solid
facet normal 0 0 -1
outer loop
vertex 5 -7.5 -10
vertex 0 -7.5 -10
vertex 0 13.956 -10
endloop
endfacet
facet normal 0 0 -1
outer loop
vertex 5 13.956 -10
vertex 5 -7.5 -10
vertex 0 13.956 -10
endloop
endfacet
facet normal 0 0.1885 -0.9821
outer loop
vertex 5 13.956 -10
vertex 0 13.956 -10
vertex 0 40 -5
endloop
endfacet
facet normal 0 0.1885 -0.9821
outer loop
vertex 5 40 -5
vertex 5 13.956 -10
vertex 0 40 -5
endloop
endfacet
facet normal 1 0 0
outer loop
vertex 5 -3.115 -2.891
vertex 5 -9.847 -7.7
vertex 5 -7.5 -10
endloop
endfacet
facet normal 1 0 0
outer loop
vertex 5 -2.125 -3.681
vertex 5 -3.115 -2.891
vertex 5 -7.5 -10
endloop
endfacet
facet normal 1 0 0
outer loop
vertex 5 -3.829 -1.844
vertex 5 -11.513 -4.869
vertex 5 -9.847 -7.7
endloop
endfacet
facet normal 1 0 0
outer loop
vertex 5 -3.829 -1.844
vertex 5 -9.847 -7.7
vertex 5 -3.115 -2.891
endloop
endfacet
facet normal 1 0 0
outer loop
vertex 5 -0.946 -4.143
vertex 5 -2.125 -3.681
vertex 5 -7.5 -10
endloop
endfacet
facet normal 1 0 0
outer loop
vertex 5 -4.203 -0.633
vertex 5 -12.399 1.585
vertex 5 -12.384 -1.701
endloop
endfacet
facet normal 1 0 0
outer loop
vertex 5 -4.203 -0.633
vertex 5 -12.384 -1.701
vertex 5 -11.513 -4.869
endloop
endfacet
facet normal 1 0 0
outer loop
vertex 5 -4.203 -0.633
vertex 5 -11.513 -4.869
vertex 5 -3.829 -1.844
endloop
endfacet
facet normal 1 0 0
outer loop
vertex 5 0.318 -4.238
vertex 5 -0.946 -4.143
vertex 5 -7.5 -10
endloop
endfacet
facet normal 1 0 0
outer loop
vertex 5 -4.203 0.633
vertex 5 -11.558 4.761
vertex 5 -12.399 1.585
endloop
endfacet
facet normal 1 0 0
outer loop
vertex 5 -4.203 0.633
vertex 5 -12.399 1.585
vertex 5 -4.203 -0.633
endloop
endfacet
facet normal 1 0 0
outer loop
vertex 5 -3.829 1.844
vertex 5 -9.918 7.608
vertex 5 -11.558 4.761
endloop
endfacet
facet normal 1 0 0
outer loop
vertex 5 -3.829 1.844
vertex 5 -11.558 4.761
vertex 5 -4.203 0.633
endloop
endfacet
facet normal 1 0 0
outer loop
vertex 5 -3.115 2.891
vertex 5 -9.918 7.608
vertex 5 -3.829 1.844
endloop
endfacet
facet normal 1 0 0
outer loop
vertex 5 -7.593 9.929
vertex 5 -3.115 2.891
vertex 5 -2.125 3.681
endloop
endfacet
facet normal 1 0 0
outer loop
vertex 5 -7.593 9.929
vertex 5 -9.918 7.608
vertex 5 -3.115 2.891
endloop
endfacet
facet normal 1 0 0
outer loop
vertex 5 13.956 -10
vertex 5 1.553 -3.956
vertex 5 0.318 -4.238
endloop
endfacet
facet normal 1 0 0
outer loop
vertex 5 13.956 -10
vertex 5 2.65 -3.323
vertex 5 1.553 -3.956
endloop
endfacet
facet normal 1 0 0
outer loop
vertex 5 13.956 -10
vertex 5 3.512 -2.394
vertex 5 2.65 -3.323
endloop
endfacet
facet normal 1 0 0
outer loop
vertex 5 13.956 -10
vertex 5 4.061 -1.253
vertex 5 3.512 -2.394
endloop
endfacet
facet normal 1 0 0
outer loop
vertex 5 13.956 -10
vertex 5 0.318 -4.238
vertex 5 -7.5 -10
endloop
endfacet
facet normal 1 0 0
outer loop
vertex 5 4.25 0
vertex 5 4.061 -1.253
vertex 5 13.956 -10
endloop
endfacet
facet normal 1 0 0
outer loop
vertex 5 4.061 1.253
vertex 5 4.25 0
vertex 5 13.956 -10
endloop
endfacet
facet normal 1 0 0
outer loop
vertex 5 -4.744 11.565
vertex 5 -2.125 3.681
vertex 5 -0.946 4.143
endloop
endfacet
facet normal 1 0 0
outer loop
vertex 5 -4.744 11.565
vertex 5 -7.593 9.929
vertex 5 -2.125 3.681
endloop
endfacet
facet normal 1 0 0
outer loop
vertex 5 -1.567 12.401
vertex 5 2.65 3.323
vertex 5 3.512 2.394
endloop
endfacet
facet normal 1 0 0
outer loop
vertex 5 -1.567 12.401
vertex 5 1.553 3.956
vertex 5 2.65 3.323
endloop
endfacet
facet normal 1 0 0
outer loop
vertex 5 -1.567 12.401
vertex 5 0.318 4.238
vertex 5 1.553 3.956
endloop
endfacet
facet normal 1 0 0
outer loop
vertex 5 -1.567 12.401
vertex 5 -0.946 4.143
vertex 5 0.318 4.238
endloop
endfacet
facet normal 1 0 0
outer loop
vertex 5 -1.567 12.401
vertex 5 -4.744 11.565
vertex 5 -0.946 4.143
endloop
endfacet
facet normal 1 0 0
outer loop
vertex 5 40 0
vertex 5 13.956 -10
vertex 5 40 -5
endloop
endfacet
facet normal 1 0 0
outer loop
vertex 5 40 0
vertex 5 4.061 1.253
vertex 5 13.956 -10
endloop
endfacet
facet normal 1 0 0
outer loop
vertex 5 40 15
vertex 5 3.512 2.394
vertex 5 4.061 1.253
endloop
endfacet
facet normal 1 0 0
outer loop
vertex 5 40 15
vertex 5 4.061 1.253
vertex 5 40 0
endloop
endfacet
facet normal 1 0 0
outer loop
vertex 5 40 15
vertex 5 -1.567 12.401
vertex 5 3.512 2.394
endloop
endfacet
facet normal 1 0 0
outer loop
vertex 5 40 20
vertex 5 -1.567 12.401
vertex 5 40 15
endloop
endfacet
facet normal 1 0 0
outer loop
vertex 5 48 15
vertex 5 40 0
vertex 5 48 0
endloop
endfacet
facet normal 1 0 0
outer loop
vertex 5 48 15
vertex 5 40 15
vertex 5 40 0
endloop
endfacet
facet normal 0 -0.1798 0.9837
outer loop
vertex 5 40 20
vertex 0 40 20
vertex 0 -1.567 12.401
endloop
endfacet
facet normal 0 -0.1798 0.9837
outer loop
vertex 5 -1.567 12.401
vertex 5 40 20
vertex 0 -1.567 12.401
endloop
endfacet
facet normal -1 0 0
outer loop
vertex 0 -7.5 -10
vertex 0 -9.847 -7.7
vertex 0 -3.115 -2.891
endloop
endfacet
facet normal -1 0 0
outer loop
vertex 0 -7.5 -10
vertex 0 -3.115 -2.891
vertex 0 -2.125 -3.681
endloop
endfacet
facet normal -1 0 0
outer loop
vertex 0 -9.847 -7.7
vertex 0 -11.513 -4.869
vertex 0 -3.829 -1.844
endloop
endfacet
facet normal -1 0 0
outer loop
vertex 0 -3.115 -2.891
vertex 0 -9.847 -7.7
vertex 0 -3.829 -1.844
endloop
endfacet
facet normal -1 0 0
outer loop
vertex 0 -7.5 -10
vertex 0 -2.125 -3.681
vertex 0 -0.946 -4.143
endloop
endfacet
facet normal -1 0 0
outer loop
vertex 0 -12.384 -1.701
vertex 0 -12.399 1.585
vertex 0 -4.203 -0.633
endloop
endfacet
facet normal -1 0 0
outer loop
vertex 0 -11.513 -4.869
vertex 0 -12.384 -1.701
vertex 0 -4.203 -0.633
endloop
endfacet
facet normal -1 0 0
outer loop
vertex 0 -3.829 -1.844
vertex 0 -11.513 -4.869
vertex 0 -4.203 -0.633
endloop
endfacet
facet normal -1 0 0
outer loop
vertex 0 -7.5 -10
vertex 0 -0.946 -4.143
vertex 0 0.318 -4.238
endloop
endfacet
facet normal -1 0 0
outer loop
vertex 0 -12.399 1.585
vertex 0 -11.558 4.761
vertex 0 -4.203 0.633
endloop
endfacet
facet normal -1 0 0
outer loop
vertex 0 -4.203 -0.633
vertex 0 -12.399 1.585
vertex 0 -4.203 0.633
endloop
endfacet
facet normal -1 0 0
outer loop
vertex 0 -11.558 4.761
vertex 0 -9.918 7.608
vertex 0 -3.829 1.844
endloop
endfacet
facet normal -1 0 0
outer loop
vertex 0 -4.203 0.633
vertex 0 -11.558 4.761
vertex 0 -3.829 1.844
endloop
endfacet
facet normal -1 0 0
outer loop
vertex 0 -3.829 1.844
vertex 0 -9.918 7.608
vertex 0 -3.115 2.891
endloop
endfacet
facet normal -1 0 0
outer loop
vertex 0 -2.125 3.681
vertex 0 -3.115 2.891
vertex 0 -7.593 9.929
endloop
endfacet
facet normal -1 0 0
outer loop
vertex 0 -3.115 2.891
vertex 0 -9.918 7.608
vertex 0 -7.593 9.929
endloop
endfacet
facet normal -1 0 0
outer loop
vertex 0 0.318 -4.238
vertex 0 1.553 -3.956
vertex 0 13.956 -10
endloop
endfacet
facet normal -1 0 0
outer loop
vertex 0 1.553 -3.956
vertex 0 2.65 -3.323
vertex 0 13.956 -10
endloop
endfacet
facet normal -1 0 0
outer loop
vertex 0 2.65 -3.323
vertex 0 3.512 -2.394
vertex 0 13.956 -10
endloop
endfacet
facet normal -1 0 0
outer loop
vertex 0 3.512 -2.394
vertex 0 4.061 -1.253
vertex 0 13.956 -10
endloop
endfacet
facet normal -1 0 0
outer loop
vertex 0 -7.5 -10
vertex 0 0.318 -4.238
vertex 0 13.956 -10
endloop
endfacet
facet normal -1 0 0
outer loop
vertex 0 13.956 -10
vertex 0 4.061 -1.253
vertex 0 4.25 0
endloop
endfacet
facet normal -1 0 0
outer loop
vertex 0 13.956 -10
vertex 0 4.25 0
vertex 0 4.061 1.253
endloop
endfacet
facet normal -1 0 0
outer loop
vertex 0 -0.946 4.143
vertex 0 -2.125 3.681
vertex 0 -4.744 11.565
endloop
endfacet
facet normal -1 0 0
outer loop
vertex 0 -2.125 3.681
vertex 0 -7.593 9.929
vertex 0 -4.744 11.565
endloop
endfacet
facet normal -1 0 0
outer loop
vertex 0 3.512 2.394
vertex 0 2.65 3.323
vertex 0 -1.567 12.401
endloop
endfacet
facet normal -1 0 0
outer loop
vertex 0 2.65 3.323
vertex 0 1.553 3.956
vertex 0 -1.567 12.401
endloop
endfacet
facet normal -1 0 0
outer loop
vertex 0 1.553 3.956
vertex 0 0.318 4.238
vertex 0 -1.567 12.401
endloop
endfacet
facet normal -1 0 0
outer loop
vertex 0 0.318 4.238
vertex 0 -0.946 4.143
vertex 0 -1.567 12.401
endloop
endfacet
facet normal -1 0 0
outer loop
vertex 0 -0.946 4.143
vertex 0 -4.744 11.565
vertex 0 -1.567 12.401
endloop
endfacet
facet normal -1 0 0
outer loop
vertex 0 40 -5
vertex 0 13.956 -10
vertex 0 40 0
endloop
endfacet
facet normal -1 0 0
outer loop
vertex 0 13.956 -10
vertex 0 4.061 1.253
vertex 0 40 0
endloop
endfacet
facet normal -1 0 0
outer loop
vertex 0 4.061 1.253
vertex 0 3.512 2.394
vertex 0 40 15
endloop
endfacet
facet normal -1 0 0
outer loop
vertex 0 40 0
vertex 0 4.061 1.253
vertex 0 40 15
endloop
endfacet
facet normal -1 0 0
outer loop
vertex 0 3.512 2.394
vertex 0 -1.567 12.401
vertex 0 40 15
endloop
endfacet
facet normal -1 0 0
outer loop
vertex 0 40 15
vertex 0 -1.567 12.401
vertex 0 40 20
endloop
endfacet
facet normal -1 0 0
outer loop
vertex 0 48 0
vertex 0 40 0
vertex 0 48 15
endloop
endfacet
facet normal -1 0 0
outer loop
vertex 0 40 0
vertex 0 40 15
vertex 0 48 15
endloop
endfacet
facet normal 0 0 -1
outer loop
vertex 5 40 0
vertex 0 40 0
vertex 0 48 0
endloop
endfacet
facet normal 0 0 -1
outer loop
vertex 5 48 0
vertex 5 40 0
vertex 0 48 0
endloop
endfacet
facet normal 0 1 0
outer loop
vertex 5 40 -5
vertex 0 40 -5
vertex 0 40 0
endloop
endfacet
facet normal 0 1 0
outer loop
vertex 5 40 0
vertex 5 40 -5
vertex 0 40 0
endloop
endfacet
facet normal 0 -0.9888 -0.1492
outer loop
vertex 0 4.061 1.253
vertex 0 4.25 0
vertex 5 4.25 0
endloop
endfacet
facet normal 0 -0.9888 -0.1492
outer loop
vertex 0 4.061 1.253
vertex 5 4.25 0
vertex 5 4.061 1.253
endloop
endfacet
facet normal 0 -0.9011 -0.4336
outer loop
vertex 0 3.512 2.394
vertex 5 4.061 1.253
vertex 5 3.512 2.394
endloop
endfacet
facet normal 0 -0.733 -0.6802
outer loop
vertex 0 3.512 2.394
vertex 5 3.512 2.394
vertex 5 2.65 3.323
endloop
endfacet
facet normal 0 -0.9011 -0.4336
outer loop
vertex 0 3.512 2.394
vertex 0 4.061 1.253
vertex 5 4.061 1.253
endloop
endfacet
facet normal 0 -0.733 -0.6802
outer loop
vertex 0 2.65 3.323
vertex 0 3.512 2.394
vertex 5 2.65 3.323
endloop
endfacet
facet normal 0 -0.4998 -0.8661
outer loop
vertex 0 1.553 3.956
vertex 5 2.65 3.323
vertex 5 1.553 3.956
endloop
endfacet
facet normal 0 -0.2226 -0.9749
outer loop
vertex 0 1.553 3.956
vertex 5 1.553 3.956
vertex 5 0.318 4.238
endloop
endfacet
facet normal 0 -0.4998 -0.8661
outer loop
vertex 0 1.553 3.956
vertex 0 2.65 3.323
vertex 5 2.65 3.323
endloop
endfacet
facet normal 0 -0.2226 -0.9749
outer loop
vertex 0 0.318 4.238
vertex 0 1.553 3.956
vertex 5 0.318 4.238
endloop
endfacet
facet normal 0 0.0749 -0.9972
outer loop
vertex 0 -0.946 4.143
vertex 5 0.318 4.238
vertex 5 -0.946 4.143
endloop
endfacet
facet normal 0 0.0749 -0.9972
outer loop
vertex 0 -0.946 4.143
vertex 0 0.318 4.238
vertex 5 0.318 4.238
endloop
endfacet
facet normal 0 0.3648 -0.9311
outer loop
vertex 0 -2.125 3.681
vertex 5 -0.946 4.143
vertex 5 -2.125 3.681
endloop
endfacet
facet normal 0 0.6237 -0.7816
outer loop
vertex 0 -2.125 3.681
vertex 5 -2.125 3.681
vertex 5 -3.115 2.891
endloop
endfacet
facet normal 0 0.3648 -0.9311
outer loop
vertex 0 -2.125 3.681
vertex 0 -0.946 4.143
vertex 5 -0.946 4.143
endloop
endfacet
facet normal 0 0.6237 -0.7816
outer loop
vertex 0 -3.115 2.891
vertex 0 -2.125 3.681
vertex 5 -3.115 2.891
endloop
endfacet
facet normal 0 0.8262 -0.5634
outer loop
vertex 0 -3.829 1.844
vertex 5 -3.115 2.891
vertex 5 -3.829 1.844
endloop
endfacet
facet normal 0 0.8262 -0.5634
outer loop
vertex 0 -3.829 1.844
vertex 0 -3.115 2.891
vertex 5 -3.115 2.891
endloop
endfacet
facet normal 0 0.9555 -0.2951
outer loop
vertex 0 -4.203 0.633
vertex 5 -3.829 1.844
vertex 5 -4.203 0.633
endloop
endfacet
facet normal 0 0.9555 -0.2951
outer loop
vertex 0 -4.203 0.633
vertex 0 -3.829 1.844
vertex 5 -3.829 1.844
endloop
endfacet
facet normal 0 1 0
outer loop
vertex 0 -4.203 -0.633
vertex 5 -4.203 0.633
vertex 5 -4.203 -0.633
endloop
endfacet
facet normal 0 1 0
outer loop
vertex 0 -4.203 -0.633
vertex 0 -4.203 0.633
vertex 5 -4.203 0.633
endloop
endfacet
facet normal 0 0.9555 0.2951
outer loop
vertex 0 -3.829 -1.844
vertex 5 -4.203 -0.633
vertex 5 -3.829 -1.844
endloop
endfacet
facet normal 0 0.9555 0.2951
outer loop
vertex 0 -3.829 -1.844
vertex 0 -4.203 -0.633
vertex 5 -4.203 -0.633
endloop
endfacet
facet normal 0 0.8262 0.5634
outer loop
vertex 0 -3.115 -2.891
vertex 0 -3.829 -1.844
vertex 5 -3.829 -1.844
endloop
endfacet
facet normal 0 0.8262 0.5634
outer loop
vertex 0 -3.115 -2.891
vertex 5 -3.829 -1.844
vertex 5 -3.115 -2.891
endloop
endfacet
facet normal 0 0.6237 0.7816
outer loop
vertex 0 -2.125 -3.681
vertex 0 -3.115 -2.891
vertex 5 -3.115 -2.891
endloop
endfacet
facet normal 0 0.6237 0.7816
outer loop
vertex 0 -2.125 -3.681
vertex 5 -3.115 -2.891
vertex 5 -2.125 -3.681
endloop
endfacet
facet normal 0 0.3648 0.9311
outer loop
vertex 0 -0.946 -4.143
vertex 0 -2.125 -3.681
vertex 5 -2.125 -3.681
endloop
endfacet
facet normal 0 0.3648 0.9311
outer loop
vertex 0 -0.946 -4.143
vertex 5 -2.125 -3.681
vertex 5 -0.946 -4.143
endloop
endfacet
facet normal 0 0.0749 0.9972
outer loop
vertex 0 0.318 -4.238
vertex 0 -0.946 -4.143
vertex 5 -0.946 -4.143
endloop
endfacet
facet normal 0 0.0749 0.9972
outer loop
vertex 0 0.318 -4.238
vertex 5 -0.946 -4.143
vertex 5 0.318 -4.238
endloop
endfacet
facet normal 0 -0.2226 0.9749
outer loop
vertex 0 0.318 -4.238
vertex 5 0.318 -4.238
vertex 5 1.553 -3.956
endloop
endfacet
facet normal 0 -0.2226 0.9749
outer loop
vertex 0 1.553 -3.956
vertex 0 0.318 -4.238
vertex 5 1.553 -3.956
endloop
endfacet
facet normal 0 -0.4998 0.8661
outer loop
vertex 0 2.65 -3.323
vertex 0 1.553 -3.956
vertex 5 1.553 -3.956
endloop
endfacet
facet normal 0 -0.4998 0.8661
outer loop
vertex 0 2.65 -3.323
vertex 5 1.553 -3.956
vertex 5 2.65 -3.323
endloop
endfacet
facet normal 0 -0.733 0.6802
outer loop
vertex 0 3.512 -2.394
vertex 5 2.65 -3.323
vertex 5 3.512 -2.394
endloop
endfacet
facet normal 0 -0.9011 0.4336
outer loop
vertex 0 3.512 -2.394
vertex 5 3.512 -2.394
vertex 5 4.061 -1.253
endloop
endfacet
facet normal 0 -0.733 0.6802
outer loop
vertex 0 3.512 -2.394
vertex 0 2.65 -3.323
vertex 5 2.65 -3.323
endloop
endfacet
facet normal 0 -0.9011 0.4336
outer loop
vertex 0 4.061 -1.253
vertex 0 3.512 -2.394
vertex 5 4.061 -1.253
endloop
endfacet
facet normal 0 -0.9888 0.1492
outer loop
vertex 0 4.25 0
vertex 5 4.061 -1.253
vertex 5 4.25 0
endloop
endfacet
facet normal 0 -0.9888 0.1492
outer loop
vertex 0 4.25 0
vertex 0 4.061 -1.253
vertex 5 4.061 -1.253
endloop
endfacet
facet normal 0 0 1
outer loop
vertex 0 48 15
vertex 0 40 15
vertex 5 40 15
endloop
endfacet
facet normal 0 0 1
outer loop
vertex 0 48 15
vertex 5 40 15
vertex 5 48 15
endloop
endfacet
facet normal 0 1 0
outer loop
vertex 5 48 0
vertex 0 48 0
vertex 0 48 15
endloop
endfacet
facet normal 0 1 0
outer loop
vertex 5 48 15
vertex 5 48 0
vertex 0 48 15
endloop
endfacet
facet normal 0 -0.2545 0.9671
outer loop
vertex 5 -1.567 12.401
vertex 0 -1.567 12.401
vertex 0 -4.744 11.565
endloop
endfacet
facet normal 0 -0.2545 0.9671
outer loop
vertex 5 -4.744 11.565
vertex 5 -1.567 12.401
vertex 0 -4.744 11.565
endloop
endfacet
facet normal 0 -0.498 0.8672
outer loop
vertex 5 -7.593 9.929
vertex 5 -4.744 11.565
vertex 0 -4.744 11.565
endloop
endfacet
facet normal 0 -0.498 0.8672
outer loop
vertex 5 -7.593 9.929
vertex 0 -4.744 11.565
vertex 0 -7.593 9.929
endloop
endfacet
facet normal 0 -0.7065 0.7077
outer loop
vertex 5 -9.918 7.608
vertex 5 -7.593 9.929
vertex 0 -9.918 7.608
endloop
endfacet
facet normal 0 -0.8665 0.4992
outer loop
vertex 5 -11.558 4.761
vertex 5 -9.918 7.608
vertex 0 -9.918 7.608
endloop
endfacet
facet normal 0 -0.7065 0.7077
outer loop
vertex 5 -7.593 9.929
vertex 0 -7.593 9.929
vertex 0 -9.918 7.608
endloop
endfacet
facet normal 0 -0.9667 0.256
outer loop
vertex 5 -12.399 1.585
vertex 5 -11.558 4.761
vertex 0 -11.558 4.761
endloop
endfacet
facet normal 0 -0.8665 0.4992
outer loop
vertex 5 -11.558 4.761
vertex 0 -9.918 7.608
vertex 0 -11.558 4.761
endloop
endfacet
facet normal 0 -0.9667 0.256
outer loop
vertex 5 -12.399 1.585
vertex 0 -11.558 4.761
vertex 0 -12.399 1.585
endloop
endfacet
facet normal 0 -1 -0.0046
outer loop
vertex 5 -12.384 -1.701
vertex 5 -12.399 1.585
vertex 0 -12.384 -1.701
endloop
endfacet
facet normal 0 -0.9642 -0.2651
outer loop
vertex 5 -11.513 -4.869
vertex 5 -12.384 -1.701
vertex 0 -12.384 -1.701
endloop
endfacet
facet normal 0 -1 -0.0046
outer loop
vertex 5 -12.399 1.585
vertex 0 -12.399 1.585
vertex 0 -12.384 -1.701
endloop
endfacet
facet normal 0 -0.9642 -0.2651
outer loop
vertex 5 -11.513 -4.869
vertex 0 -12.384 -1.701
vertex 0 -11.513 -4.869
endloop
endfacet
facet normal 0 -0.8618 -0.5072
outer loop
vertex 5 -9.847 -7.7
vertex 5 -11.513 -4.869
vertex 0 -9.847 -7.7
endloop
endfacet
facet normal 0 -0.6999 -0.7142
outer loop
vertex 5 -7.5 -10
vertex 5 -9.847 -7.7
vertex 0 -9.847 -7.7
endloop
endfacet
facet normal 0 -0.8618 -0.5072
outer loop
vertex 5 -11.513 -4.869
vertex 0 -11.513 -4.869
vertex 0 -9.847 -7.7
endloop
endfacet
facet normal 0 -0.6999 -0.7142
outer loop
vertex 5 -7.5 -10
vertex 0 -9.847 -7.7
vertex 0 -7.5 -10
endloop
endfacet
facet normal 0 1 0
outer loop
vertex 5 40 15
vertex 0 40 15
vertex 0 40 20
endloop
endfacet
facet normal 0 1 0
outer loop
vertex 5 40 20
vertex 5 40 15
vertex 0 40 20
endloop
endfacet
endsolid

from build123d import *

# Parameters (mm, degrees)
F0_R     = 4.25
F0_W     = 8
F0_H     = 15
F1_DEPTH = 5


# Not quite as in the source:
# - a feature names something its author has since deleted; it is built from what else it names


with BuildPart() as f1:
    # F0 (on Right) → F1 (new body)
    with BuildSketch(Plane.YZ):
        with BuildLine():
            Line((-7.5, -10), (7.5, -10))
            ThreePointArc((7.5, -10), (11.5869510213, 4.689623229), (-1.5666059757, 12.4014412758))
            ThreePointArc((-1.5666059757, 12.4014412758), (-12.0833347544, 3.2004720296), (-7.5, -10))
        make_face()
        Circle(F0_R, mode=Mode.SUBTRACT)
        with BuildLine():
            ThreePointArc((-1.5666059757, 12.4014412758), (11.5869510213, 4.689623229), (7.5, -10))
            Line((7.5, -10), (13.9559781345, -10))
            Line((13.9559781345, -10), (40, -5))
            Line((40, -5), (40, 0))
            Line((40, 0), (40, 15))
            Line((40, 15), (40, 20))
            Line((40, 20), (-1.5666059757, 12.4014412758))
        make_face()
        with Locations((44, 7.5)):
            Rectangle(F0_W, F0_H)
    extrude(amount=F1_DEPTH)


solid = f1.part
